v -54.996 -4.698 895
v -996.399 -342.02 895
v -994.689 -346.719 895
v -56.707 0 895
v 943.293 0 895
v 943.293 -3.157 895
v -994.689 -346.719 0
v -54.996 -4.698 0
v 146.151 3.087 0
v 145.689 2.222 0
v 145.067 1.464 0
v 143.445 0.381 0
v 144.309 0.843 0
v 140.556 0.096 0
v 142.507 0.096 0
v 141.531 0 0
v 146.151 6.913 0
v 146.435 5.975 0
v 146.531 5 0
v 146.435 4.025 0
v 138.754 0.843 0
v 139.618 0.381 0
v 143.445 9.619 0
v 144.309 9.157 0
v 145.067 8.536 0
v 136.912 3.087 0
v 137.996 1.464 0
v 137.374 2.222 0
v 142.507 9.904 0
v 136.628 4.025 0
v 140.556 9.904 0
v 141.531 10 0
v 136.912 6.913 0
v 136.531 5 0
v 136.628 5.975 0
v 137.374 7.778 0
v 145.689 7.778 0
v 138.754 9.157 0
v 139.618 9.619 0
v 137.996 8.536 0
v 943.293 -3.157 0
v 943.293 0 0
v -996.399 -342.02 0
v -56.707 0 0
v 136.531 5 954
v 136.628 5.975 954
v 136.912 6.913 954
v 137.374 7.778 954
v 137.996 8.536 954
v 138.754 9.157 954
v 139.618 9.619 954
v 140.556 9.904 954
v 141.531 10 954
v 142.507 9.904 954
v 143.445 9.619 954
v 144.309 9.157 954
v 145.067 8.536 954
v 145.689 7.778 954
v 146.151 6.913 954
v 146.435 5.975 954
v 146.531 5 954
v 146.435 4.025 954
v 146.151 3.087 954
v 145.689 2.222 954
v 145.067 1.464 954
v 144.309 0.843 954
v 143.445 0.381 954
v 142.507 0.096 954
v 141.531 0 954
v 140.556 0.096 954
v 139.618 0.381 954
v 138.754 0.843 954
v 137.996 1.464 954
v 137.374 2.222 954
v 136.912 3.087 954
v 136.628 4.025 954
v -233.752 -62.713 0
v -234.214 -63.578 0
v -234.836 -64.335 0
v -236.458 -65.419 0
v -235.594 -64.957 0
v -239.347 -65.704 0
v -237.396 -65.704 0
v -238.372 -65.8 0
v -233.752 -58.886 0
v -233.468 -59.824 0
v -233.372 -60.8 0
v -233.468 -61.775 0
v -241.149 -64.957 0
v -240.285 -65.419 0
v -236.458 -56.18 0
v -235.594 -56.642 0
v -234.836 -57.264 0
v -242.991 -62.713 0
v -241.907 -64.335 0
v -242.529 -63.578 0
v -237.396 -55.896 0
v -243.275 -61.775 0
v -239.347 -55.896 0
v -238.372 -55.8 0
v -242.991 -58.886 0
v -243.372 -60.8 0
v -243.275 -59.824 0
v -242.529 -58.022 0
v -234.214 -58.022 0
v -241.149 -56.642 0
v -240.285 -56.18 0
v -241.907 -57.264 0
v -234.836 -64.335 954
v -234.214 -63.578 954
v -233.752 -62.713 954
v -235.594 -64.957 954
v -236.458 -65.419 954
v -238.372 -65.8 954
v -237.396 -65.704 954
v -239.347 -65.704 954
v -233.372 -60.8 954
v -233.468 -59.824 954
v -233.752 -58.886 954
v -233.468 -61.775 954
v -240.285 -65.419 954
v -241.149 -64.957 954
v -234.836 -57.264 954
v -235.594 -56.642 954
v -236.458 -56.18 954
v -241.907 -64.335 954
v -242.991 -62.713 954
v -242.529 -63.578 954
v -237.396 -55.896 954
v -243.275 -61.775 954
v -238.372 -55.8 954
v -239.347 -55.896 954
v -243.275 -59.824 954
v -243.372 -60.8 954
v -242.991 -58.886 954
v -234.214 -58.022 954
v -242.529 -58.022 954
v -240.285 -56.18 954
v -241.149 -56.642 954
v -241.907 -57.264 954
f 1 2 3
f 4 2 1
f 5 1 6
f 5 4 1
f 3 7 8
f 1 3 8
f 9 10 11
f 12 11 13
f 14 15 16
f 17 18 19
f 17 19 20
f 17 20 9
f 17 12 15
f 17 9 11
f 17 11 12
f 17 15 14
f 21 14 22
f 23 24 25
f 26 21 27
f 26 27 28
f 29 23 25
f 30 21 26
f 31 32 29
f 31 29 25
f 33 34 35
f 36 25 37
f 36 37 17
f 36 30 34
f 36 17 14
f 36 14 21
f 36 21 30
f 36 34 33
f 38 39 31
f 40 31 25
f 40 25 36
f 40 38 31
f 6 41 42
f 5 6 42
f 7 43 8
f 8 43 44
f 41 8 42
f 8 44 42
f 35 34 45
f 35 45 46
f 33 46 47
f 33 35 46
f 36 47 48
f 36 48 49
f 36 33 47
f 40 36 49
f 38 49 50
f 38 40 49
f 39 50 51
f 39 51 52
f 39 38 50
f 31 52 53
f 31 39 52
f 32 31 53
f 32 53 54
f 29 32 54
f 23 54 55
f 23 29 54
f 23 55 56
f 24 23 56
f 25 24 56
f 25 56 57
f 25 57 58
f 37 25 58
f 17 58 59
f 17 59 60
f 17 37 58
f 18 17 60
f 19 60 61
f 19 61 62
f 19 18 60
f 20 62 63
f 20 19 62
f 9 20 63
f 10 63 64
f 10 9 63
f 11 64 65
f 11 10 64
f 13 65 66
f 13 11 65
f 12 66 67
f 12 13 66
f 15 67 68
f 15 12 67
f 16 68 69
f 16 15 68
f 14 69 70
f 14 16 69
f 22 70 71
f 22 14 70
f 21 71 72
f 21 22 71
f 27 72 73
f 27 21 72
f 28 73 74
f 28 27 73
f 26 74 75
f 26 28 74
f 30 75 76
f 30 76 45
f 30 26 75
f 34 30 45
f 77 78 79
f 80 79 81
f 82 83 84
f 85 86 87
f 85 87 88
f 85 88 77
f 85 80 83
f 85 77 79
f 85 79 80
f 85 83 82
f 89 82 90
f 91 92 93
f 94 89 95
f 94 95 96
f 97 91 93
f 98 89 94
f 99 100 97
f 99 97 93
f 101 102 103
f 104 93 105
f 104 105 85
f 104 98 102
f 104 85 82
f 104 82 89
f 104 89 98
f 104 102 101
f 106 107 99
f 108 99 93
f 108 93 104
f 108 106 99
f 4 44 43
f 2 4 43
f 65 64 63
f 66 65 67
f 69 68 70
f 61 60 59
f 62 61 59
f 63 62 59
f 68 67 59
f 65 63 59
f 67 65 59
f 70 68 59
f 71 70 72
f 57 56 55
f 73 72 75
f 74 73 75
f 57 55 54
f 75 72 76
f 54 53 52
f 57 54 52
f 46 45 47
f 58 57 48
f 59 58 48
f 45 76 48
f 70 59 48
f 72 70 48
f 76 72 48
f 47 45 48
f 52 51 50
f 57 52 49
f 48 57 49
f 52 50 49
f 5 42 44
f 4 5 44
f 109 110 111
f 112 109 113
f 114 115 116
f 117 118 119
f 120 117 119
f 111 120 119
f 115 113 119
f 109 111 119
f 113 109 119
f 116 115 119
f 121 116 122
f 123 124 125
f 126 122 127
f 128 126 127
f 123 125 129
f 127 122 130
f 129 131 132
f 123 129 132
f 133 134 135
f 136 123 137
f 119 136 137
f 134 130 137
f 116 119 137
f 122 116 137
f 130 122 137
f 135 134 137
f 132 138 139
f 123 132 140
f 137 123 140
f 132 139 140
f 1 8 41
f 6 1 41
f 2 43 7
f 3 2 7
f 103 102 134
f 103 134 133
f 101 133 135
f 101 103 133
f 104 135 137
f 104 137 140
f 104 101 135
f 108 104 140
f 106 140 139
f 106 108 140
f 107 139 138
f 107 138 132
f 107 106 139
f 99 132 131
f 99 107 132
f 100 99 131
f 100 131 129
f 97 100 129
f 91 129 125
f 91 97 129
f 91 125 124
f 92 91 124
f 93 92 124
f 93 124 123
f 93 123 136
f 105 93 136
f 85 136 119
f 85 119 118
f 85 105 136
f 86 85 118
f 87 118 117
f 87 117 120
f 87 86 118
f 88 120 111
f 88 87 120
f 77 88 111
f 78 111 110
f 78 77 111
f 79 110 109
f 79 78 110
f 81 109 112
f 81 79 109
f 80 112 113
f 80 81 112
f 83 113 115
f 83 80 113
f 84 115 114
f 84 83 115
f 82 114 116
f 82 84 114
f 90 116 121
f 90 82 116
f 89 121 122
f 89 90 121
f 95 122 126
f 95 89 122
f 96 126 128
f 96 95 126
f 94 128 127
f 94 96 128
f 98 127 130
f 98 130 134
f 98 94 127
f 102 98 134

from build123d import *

# Parameters (mm, degrees)
RESSALTO_EXTRUS_O3_DEPTH   = 895
ESBO_O12_R                 = 5
RESSALTO_EXTRUS_O4_DEPTH   = 954
RESSALTO_EXTRUS_O4_2_DEPTH = 954


with BuildPart() as part:
    # Esboço10 → Ressalto-extrusão3 (new body)
    with BuildSketch(Plane.XY):
        Polygon((943.293464845, 0), (-56.706535155, 0), (-996.399155941, -342.020143326), (-994.689055225, -346.71860643), (-54.996434439, -4.698463104), (943.293464845, -3.156637289), align=None)
    extrude(amount=RESSALTO_EXTRUS_O3_DEPTH)


with BuildPart() as body_2:
    # Esboço12 → Ressalto-extrusão4 (new body)
    with BuildSketch(Plane(origin=(0, 0, 0), x_dir=(-1, 0, 0), z_dir=(0, 0, -1))):
        with Locations((-141.531462956, 5)):
            Circle(ESBO_O12_R)
    extrude(amount=-RESSALTO_EXTRUS_O4_DEPTH)


with BuildPart() as body_3:
    # Esboço12 → Ressalto-extrus_o4 2 (new body)
    with BuildSketch(Plane(origin=(0, 0, 0), x_dir=(-1, 0, 0), z_dir=(0, 0, -1))):
        with Locations((238.371547446, -60.799768219)):
            Circle(ESBO_O12_R)
    extrude(amount=-RESSALTO_EXTRUS_O4_2_DEPTH)


solid = Compound([part.part, body_2.part, body_3.part])
